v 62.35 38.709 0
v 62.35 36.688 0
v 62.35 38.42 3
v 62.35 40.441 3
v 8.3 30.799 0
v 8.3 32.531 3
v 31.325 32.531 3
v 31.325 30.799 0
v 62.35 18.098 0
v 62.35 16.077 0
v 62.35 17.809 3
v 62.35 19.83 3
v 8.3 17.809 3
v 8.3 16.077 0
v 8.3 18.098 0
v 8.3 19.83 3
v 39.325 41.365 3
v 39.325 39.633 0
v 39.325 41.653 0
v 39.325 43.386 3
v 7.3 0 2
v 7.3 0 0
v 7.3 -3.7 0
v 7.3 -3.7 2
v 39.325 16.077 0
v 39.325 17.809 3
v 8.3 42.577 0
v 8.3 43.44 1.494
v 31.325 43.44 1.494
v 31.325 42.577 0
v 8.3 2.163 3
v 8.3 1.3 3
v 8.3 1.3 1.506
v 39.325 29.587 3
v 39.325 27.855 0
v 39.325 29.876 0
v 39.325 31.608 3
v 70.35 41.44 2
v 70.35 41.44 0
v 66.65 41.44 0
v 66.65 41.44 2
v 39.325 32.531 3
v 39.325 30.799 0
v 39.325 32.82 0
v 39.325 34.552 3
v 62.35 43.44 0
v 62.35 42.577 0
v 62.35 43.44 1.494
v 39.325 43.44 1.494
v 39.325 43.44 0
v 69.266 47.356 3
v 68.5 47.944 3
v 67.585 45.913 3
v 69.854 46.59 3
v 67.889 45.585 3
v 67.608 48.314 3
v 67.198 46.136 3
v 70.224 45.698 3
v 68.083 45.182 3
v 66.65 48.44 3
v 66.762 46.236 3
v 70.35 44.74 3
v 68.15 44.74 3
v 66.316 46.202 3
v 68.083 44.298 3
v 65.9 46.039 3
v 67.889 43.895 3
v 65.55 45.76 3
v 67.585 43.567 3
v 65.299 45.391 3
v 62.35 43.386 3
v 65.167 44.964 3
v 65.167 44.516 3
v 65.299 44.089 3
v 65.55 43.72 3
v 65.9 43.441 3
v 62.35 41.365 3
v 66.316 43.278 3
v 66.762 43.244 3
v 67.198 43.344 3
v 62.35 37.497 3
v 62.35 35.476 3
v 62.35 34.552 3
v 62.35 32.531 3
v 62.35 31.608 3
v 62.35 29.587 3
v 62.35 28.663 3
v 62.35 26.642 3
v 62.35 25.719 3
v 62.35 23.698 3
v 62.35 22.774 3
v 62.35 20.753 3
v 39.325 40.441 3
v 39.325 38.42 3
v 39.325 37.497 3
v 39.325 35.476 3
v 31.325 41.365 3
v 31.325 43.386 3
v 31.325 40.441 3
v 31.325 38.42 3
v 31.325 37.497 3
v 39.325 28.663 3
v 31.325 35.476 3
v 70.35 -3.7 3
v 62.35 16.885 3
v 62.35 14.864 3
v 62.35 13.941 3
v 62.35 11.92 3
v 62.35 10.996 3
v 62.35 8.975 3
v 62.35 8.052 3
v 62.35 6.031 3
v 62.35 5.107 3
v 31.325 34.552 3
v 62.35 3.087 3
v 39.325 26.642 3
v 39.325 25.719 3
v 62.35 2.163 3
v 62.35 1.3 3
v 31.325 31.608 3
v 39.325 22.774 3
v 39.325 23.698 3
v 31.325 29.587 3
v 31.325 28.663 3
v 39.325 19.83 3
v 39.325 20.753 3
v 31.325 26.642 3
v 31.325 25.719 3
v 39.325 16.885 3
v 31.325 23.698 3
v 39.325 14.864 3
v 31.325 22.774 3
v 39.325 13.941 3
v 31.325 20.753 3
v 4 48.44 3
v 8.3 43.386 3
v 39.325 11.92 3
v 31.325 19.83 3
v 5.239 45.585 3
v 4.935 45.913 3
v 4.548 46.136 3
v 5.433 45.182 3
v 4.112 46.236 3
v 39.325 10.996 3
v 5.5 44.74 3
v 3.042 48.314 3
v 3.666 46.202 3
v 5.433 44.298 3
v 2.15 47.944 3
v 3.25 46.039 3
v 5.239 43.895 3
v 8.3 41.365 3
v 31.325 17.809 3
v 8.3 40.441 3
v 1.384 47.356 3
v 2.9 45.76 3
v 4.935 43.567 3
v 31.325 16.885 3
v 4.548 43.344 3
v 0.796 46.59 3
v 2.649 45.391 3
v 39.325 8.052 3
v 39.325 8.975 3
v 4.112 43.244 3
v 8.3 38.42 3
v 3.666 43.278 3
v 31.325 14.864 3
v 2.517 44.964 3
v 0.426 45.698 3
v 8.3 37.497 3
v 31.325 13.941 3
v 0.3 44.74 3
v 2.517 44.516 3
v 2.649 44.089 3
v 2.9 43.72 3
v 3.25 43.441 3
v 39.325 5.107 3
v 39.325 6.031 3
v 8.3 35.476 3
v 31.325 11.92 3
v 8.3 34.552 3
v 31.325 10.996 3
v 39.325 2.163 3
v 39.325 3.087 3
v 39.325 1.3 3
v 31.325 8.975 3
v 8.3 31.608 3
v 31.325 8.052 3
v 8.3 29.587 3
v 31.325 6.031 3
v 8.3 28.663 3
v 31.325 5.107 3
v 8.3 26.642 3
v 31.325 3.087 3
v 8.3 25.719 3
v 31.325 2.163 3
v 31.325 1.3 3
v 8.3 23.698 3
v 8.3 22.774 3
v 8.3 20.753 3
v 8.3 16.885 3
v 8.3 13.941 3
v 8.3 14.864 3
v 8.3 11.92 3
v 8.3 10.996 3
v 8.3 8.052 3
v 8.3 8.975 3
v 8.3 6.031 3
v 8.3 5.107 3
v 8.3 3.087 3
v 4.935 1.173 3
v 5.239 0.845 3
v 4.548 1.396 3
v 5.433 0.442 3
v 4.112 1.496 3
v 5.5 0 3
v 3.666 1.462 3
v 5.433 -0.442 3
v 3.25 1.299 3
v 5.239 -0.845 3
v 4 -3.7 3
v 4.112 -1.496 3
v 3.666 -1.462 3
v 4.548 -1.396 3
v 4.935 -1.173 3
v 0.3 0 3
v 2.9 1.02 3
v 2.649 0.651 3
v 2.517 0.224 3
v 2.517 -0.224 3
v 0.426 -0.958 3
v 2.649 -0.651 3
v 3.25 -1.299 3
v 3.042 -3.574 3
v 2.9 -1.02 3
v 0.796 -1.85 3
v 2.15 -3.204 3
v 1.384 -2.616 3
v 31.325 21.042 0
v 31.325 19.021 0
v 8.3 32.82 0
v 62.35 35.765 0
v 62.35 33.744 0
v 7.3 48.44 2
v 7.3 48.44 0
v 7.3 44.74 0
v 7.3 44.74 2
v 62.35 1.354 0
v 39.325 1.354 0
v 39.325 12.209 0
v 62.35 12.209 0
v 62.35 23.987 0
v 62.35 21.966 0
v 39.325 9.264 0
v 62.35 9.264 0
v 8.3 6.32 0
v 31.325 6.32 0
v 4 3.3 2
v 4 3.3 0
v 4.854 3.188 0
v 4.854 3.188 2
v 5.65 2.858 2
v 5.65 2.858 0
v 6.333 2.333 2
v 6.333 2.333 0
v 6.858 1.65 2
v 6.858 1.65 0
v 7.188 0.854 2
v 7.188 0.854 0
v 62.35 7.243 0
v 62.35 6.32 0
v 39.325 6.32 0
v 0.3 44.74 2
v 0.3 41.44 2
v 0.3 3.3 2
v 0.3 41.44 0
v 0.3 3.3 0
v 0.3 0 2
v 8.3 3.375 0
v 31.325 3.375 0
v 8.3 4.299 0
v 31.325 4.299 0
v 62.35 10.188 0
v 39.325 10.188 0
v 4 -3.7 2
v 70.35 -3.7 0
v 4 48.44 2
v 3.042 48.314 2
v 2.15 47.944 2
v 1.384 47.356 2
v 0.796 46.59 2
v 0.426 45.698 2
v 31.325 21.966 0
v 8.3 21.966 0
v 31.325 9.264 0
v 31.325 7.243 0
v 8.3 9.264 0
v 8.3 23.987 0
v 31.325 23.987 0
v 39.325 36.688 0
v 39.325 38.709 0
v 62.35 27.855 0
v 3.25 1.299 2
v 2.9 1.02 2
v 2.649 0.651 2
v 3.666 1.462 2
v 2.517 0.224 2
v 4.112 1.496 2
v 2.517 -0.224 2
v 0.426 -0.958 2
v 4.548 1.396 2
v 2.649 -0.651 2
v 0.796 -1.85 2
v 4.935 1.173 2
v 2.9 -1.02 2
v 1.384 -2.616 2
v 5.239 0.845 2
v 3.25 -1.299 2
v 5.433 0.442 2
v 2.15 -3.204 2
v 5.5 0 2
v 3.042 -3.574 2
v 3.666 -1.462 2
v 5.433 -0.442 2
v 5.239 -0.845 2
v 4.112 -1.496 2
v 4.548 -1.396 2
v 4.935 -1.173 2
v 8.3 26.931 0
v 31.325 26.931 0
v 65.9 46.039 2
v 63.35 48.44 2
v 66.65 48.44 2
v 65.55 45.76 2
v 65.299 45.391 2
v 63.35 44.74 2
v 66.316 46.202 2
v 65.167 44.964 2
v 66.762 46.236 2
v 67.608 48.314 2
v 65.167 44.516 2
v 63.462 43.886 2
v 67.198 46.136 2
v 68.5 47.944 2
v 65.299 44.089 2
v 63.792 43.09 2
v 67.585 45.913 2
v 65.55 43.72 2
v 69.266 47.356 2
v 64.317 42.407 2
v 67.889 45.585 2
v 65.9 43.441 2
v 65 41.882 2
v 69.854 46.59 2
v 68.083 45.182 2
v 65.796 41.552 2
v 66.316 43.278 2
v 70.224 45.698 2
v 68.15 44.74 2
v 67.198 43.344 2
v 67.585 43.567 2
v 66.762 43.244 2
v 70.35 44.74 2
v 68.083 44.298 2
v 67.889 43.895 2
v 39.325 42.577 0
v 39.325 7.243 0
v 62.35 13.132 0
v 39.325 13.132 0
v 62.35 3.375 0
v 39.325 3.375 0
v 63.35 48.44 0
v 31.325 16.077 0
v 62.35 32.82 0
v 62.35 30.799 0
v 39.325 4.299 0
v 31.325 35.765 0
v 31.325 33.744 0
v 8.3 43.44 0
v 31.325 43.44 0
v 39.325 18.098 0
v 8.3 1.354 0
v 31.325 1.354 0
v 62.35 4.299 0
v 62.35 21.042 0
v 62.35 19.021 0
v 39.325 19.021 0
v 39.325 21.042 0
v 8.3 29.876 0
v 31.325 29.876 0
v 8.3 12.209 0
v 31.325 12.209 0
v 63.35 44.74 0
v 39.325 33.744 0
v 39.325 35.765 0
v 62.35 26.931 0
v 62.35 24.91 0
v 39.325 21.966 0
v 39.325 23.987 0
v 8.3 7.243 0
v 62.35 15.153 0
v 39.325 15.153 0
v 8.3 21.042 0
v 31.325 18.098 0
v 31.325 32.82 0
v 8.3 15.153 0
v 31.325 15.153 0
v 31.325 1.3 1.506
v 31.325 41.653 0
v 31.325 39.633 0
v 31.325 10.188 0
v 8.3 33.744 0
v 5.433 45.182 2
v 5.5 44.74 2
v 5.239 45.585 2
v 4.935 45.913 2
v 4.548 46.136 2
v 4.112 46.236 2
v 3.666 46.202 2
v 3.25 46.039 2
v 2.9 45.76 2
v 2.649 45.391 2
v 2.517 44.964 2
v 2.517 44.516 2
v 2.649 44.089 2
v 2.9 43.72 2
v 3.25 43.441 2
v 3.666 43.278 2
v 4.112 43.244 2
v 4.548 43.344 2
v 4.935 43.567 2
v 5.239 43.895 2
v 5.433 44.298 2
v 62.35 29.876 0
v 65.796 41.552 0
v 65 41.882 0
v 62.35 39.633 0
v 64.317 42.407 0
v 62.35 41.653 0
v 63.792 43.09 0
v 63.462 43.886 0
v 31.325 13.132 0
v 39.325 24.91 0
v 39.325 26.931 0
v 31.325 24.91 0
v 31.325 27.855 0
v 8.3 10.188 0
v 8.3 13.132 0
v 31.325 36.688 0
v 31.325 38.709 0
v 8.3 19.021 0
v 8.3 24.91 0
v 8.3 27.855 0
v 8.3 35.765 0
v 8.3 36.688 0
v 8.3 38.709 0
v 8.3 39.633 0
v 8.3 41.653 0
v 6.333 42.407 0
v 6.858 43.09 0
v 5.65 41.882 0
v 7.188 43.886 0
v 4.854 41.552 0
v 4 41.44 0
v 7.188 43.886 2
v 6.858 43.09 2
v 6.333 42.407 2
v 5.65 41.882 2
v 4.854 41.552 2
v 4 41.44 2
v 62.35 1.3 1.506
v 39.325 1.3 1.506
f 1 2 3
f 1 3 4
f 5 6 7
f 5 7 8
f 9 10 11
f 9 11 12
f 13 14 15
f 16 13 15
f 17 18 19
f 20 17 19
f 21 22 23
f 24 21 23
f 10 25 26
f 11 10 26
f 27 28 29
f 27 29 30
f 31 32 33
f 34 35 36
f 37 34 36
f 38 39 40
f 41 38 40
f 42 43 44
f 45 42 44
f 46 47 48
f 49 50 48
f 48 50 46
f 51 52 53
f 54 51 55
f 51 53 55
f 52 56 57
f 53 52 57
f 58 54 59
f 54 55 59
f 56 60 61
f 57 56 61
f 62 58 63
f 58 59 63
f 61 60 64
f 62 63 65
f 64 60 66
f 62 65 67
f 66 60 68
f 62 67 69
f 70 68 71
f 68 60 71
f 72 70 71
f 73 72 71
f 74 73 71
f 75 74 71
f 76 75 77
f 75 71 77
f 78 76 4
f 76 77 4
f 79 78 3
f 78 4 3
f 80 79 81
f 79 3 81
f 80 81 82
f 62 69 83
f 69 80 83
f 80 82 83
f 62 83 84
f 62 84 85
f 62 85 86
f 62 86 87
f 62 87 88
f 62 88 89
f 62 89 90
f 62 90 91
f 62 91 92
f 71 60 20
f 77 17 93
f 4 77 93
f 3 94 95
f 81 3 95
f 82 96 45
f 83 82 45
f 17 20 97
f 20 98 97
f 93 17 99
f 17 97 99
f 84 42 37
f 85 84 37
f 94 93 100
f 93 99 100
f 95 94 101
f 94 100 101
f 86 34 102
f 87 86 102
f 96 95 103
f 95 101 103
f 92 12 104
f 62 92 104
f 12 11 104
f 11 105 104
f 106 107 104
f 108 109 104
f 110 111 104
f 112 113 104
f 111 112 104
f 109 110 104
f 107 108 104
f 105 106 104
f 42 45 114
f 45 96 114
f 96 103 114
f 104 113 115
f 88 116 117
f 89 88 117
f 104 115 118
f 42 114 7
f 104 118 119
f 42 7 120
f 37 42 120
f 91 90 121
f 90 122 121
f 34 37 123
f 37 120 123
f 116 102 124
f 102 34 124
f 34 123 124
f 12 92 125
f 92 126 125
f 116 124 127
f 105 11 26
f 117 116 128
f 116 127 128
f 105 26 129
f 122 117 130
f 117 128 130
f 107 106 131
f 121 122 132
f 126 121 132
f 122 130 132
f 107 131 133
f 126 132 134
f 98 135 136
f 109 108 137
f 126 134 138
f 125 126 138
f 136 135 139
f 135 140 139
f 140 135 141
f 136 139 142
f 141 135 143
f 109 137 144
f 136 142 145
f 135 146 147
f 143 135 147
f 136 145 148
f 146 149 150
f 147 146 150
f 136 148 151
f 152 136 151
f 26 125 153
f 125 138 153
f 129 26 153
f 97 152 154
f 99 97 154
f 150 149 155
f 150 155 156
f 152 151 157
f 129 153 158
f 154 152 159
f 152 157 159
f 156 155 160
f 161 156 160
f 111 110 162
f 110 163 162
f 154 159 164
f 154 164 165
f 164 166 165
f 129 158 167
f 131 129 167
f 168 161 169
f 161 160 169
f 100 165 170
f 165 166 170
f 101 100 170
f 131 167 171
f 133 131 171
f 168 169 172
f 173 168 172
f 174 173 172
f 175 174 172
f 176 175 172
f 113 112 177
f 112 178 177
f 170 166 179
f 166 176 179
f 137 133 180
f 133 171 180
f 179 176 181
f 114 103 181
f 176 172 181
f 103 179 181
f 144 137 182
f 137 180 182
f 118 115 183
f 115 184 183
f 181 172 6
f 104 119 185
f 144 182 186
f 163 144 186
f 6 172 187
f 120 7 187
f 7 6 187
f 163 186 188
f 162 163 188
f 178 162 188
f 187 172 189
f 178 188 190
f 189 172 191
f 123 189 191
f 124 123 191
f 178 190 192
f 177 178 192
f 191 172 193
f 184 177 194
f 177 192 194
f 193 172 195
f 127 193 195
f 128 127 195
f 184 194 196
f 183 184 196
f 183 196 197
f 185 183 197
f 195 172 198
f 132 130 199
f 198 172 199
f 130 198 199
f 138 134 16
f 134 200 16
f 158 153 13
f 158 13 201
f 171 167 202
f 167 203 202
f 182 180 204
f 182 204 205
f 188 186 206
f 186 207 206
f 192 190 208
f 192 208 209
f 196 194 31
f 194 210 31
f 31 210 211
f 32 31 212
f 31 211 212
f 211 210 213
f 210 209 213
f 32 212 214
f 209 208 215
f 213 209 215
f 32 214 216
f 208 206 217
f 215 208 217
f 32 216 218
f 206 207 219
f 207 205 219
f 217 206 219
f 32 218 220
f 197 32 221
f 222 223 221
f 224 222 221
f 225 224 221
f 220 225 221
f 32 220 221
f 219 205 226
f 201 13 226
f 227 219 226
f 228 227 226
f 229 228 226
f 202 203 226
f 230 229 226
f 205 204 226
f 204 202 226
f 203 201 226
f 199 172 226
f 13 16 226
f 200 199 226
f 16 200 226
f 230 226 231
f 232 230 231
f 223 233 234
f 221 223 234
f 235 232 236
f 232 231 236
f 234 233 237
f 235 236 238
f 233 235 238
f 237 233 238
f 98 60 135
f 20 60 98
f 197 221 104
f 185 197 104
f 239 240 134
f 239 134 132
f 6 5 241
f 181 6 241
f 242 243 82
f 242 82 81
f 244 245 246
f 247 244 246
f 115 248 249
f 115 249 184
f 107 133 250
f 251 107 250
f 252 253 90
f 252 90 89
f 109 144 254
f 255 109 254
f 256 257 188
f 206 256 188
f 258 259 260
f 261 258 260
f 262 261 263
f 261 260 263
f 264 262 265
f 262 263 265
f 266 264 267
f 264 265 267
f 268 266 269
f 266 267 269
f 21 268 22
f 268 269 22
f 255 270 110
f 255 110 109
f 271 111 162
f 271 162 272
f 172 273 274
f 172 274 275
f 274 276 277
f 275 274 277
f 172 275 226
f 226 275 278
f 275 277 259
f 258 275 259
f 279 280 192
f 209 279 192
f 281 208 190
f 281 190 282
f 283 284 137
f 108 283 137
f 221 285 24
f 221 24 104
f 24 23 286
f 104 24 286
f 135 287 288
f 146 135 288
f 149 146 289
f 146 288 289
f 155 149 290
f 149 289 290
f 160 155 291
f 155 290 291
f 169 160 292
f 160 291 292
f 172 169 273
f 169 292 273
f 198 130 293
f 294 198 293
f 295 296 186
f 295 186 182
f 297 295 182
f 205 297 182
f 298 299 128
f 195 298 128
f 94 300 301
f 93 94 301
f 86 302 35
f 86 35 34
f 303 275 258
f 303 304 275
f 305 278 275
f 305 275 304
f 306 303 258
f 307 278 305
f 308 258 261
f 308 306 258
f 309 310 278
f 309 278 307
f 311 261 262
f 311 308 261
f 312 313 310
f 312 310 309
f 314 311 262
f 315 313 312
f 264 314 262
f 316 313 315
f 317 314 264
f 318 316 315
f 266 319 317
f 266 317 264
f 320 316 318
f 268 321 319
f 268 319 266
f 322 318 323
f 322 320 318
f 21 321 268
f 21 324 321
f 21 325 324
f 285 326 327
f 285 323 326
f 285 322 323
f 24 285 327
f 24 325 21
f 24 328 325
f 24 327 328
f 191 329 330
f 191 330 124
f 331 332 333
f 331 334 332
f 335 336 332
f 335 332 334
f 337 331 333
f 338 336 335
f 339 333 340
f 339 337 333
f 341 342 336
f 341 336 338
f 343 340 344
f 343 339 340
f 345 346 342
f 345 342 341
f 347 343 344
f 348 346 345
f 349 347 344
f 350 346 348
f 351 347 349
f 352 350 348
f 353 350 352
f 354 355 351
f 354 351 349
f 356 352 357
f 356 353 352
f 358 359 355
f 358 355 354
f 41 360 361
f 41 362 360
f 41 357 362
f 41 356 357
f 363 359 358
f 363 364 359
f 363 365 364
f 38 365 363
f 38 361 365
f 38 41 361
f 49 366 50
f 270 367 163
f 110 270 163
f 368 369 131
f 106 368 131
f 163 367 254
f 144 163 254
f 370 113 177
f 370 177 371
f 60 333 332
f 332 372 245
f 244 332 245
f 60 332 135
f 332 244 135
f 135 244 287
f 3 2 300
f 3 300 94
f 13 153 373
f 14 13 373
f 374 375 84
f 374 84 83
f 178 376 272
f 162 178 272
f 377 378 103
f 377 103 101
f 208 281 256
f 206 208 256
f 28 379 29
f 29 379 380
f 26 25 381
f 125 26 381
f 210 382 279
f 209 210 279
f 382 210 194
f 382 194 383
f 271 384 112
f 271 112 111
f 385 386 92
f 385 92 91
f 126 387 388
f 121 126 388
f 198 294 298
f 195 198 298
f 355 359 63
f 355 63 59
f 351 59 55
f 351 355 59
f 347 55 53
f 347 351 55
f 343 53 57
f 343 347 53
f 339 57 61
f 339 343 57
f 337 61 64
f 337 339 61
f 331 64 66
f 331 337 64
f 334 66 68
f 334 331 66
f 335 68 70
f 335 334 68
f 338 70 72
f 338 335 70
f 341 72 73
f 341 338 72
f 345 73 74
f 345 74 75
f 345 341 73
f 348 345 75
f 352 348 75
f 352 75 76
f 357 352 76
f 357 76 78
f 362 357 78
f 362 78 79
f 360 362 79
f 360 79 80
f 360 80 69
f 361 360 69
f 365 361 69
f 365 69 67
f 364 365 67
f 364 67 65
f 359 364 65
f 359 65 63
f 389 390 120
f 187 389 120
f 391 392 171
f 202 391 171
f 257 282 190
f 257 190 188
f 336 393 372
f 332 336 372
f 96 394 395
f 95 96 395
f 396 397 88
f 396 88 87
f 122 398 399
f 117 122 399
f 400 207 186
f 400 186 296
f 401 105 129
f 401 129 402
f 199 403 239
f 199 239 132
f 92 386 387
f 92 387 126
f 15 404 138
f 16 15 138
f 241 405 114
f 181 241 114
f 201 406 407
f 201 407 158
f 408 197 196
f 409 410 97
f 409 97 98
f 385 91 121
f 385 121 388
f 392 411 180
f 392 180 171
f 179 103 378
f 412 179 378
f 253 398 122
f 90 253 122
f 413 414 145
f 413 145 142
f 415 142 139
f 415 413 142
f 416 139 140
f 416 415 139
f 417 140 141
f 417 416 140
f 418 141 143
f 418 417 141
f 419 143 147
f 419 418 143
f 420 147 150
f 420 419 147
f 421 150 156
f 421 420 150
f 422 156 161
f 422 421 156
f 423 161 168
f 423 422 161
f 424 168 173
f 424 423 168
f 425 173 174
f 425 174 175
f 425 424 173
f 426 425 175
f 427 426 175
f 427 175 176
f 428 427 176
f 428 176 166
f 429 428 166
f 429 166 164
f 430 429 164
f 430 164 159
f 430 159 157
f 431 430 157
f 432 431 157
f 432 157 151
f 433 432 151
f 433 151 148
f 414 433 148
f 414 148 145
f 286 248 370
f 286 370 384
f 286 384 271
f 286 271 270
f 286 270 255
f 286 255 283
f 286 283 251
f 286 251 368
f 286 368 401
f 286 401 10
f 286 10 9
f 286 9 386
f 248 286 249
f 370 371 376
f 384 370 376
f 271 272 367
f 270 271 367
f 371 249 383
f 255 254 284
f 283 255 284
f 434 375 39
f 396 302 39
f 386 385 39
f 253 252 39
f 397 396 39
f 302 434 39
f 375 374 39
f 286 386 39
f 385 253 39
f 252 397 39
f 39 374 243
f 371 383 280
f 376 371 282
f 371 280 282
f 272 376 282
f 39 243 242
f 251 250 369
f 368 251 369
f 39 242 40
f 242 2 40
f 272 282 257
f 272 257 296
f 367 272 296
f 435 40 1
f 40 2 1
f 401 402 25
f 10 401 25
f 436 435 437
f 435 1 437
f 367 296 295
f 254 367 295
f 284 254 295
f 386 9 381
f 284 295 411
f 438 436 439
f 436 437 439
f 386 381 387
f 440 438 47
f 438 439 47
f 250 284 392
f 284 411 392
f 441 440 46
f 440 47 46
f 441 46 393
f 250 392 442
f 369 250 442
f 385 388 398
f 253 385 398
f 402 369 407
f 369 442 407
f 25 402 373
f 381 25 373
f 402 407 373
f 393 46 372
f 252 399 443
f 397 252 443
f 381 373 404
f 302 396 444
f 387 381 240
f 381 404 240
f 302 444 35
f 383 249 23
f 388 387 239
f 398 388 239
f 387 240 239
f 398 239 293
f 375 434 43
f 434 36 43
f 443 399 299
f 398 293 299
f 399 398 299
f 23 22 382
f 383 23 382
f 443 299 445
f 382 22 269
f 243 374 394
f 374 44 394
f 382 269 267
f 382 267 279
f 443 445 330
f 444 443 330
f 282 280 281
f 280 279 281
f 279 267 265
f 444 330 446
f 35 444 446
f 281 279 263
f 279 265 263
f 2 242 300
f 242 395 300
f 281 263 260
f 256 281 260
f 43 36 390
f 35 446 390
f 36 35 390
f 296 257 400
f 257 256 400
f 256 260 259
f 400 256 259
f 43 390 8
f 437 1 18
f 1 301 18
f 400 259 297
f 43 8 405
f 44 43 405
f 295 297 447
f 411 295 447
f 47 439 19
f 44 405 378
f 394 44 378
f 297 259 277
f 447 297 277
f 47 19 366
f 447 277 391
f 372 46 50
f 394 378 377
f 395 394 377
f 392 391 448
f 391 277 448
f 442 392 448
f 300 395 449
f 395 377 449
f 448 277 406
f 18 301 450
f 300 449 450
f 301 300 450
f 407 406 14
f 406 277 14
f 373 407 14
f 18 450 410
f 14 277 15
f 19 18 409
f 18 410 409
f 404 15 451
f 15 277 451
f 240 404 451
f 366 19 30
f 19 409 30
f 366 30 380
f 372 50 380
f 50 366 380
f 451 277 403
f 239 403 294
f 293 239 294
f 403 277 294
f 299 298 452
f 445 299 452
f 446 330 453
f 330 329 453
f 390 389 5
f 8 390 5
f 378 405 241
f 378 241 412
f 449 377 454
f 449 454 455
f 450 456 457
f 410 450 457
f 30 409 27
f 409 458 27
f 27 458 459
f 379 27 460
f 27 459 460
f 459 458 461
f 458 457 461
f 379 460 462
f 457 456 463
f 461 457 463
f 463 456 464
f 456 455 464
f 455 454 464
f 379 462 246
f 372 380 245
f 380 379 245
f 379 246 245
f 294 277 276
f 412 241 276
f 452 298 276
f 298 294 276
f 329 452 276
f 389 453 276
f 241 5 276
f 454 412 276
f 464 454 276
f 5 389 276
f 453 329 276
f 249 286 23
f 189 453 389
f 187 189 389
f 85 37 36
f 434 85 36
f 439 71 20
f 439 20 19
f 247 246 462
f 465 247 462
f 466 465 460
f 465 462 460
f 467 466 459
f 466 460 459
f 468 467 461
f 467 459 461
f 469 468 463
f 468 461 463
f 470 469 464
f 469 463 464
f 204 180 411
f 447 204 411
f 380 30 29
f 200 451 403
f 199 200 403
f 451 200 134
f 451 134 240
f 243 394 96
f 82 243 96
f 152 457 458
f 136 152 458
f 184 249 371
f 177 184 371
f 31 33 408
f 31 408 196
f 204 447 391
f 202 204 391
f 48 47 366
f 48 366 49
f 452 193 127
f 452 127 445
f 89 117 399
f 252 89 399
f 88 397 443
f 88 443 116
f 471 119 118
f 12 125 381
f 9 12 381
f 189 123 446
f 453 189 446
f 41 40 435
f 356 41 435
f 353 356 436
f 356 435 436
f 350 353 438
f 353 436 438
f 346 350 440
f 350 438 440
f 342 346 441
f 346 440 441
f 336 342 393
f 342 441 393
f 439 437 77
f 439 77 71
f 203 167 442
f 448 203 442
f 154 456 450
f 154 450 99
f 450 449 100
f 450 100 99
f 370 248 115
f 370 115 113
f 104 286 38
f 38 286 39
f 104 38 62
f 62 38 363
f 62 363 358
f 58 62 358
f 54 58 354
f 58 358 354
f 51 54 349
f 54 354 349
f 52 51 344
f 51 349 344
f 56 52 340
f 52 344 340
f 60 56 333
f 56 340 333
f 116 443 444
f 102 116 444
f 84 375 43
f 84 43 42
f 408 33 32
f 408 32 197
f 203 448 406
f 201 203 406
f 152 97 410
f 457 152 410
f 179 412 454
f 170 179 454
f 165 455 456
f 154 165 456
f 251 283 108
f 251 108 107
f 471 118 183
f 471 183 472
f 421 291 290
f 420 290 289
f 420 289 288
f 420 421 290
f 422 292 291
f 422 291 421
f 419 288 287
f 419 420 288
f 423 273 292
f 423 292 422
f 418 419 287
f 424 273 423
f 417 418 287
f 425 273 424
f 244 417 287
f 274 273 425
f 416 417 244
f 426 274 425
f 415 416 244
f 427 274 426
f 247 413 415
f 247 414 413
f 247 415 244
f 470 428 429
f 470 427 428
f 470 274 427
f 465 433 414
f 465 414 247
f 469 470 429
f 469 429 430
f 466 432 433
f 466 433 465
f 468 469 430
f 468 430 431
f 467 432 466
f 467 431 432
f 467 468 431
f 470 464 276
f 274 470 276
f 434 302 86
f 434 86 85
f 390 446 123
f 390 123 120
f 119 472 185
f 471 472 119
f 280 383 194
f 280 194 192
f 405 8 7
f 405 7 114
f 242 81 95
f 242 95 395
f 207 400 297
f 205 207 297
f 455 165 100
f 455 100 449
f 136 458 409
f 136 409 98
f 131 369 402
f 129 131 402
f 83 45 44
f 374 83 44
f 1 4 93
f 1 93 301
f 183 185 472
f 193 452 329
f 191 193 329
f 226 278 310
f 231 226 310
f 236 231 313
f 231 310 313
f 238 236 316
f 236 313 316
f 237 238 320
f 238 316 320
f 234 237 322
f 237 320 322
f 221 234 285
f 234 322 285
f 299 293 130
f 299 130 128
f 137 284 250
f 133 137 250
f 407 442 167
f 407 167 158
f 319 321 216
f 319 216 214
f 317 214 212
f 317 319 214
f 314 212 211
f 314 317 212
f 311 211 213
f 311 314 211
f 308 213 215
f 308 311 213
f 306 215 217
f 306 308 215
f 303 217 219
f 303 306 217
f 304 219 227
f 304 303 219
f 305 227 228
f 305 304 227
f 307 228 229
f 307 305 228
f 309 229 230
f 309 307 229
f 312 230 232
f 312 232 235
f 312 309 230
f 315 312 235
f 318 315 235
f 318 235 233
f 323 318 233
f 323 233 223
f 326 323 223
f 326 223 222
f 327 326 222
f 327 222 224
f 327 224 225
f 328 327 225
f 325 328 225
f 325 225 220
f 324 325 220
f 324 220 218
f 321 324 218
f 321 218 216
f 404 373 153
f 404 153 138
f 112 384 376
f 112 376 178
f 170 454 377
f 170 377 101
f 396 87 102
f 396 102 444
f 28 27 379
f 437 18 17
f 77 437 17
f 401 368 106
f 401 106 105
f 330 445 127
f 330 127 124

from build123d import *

# Parameters (mm, degrees)
F1_R     = 1.5
F1_W     = 23.025
F1_H     = 42.14
F2_DEPTH = 3
F4_DEPTH = 23.025
F6_DEPTH = 23.025
F8_DEPTH = 2


with BuildPart() as f2:
    # F1 (on Top) → F2 (new body)
    with BuildSketch(Plane.XY):
        with BuildLine():
            ThreePointArc((4, 48.44), (1.383705, 47.356295), (0.3, 44.74))
            Line((0.3, 44.74), (0.3, 0))
            ThreePointArc((0.3, 0), (1.383705, -2.616295), (4, -3.7))
            Line((4, -3.7), (70.35, -3.7))
            Line((70.35, -3.7), (70.35, 44.74))
            ThreePointArc((70.35, 44.74), (69.266295, 47.356295), (66.65, 48.44))
            Line((66.65, 48.44), (4, 48.44))
        make_face()
        with Locations((4, 0)):
            Circle(F1_R, mode=Mode.SUBTRACT)
        with Locations((19.8125, 22.37)):
            Rectangle(F1_W, F1_H, mode=Mode.SUBTRACT)
        with Locations((4, 44.74)):
            Circle(F1_R, mode=Mode.SUBTRACT)
        with Locations((50.8375, 22.37)):
            Rectangle(F1_W, F1_H, mode=Mode.SUBTRACT)
        with Locations((66.65, 44.74)):
            Circle(F1_R, mode=Mode.SUBTRACT)
    extrude(amount=F2_DEPTH)

    # F3 (on face) → F4 (join)
    with BuildSketch(Plane(origin=(31.325, 0, 0), x_dir=(0, -1, 0), z_dir=(-1, 0, 0))):
        Polygon((-22.774145, 3), (-23.697906, 3), (-21.965855, 0), (-21.042094, 0), align=None)
        Polygon((-19.829659, 3), (-20.753419, 3), (-19.021368, 0), (-18.097608, 0), align=None)
        Polygon((-16.885172, 3), (-17.808933, 3), (-16.076882, 0), (-15.153122, 0), align=None)
        Polygon((-13.940686, 3), (-14.864447, 3), (-13.132396, 0), (-12.208635, 0), align=None)
        Polygon((-10.9962, 3), (-11.91996, 3), (-10.187909, 0), (-9.264149, 0), align=None)
        Polygon((-8.051713, 3), (-8.975474, 3), (-7.243423, 0), (-6.319663, 0), align=None)
        Polygon((-5.107227, 3), (-6.030987, 3), (-4.298937, 0), (-3.375176, 0), align=None)
        Polygon((-3.086501, 3), (-1.35445, 0), (-1.3, 0), (-1.3, 1.505689), (-2.162741, 3), align=None)
        Polygon((-23.986581, 0), (-25.718632, 3), (-26.642392, 3), (-24.910341, 0), align=None)
        Polygon((-26.931067, 0), (-28.663118, 3), (-29.586878, 3), (-27.854828, 0), align=None)
        Polygon((-29.875553, 0), (-31.607604, 3), (-32.531365, 3), (-30.799314, 0), align=None)
        Polygon((-32.82004, 0), (-34.552091, 3), (-35.475851, 3), (-33.7438, 0), align=None)
        Polygon((-37.496577, 3), (-38.420337, 3), (-36.688287, 0), (-35.764526, 0), align=None)
        Polygon((-38.709013, 0), (-40.441063, 3), (-41.364824, 3), (-39.632773, 0), align=None)
        Polygon((-42.577259, 0), (-41.653499, 0), (-43.38555, 3), (-43.44, 3), (-43.44, 1.494311), align=None)
    extrude(amount=F4_DEPTH)

    # F5 (on face) → F6 (join)
    with BuildSketch(Plane.YZ.offset(39.325)):
        Polygon((23.697906, 3), (22.774145, 3), (21.042094, 0), (21.965855, 0), align=None)
        Polygon((26.642392, 3), (25.718632, 3), (23.986581, 0), (24.910341, 0), align=None)
        Polygon((29.586878, 3), (28.663118, 3), (26.931067, 0), (27.854828, 0), align=None)
        Polygon((32.531365, 3), (31.607604, 3), (29.875553, 0), (30.799314, 0), align=None)
        Polygon((35.475851, 3), (34.552091, 3), (32.82004, 0), (33.7438, 0), align=None)
        Polygon((38.420337, 3), (37.496577, 3), (35.764526, 0), (36.688287, 0), align=None)
        Polygon((41.364824, 3), (40.441063, 3), (38.709013, 0), (39.632773, 0), align=None)
        Polygon((43.44, 1.494311), (43.44, 3), (43.38555, 3), (41.653499, 0), (42.577259, 0), align=None)
        Polygon((19.021368, 0), (20.753419, 3), (19.829659, 3), (18.097608, 0), align=None)
        Polygon((16.076882, 0), (17.808933, 3), (16.885172, 3), (15.153122, 0), align=None)
        Polygon((13.132396, 0), (14.864447, 3), (13.940686, 3), (12.208635, 0), align=None)
        Polygon((10.187909, 0), (11.91996, 3), (10.9962, 3), (9.264149, 0), align=None)
        Polygon((7.243423, 0), (8.975474, 3), (8.051713, 3), (6.319663, 0), align=None)
        Polygon((4.298937, 0), (6.030987, 3), (5.107227, 3), (3.375176, 0), align=None)
        Polygon((1.3, 1.505689), (1.3, 0), (1.35445, 0), (3.086501, 3), (2.162741, 3), align=None)
    extrude(amount=F6_DEPTH)

    # F7 (on face) → F8 (cut)
    with BuildSketch(Plane(origin=(0, 0, 0), x_dir=(1, 0, 0), z_dir=(0, 0, -1))):
        with BuildLine():
            Line((7.3, 0), (7.3, 3.7))
            Line((7.3, 3.7), (4, 3.7))
            ThreePointArc((4, 3.7), (1.383705, 2.616295), (0.3, 0))
            Line((0.3, 0), (0.3, -3.3))
            Line((0.3, -3.3), (4, -3.3))
            ThreePointArc((4, -3.3), (6.333452, -2.333452), (7.3, 0))
        make_face()
        with BuildLine():
            Line((0.3, -41.44), (0.3, -44.74))
            ThreePointArc((0.3, -44.74), (1.383705, -47.356295), (4, -48.44))
            Line((4, -48.44), (7.3, -48.44))
            Line((7.3, -48.44), (7.3, -44.74))
            ThreePointArc((7.3, -44.74), (6.333452, -42.406548), (4, -41.44))
            Line((4, -41.44), (0.3, -41.44))
        make_face()
        with BuildLine():
            Line((63.35, -48.44), (66.65, -48.44))
            ThreePointArc((66.65, -48.44), (69.266295, -47.356295), (70.35, -44.74))
            Line((70.35, -44.74), (70.35, -41.44))
            Line((70.35, -41.44), (66.65, -41.44))
            ThreePointArc((66.65, -41.44), (64.316548, -42.406548), (63.35, -44.74))
            Line((63.35, -44.74), (63.35, -48.44))
        make_face()
    extrude(amount=-F8_DEPTH, mode=Mode.SUBTRACT)


solid = f2.part
